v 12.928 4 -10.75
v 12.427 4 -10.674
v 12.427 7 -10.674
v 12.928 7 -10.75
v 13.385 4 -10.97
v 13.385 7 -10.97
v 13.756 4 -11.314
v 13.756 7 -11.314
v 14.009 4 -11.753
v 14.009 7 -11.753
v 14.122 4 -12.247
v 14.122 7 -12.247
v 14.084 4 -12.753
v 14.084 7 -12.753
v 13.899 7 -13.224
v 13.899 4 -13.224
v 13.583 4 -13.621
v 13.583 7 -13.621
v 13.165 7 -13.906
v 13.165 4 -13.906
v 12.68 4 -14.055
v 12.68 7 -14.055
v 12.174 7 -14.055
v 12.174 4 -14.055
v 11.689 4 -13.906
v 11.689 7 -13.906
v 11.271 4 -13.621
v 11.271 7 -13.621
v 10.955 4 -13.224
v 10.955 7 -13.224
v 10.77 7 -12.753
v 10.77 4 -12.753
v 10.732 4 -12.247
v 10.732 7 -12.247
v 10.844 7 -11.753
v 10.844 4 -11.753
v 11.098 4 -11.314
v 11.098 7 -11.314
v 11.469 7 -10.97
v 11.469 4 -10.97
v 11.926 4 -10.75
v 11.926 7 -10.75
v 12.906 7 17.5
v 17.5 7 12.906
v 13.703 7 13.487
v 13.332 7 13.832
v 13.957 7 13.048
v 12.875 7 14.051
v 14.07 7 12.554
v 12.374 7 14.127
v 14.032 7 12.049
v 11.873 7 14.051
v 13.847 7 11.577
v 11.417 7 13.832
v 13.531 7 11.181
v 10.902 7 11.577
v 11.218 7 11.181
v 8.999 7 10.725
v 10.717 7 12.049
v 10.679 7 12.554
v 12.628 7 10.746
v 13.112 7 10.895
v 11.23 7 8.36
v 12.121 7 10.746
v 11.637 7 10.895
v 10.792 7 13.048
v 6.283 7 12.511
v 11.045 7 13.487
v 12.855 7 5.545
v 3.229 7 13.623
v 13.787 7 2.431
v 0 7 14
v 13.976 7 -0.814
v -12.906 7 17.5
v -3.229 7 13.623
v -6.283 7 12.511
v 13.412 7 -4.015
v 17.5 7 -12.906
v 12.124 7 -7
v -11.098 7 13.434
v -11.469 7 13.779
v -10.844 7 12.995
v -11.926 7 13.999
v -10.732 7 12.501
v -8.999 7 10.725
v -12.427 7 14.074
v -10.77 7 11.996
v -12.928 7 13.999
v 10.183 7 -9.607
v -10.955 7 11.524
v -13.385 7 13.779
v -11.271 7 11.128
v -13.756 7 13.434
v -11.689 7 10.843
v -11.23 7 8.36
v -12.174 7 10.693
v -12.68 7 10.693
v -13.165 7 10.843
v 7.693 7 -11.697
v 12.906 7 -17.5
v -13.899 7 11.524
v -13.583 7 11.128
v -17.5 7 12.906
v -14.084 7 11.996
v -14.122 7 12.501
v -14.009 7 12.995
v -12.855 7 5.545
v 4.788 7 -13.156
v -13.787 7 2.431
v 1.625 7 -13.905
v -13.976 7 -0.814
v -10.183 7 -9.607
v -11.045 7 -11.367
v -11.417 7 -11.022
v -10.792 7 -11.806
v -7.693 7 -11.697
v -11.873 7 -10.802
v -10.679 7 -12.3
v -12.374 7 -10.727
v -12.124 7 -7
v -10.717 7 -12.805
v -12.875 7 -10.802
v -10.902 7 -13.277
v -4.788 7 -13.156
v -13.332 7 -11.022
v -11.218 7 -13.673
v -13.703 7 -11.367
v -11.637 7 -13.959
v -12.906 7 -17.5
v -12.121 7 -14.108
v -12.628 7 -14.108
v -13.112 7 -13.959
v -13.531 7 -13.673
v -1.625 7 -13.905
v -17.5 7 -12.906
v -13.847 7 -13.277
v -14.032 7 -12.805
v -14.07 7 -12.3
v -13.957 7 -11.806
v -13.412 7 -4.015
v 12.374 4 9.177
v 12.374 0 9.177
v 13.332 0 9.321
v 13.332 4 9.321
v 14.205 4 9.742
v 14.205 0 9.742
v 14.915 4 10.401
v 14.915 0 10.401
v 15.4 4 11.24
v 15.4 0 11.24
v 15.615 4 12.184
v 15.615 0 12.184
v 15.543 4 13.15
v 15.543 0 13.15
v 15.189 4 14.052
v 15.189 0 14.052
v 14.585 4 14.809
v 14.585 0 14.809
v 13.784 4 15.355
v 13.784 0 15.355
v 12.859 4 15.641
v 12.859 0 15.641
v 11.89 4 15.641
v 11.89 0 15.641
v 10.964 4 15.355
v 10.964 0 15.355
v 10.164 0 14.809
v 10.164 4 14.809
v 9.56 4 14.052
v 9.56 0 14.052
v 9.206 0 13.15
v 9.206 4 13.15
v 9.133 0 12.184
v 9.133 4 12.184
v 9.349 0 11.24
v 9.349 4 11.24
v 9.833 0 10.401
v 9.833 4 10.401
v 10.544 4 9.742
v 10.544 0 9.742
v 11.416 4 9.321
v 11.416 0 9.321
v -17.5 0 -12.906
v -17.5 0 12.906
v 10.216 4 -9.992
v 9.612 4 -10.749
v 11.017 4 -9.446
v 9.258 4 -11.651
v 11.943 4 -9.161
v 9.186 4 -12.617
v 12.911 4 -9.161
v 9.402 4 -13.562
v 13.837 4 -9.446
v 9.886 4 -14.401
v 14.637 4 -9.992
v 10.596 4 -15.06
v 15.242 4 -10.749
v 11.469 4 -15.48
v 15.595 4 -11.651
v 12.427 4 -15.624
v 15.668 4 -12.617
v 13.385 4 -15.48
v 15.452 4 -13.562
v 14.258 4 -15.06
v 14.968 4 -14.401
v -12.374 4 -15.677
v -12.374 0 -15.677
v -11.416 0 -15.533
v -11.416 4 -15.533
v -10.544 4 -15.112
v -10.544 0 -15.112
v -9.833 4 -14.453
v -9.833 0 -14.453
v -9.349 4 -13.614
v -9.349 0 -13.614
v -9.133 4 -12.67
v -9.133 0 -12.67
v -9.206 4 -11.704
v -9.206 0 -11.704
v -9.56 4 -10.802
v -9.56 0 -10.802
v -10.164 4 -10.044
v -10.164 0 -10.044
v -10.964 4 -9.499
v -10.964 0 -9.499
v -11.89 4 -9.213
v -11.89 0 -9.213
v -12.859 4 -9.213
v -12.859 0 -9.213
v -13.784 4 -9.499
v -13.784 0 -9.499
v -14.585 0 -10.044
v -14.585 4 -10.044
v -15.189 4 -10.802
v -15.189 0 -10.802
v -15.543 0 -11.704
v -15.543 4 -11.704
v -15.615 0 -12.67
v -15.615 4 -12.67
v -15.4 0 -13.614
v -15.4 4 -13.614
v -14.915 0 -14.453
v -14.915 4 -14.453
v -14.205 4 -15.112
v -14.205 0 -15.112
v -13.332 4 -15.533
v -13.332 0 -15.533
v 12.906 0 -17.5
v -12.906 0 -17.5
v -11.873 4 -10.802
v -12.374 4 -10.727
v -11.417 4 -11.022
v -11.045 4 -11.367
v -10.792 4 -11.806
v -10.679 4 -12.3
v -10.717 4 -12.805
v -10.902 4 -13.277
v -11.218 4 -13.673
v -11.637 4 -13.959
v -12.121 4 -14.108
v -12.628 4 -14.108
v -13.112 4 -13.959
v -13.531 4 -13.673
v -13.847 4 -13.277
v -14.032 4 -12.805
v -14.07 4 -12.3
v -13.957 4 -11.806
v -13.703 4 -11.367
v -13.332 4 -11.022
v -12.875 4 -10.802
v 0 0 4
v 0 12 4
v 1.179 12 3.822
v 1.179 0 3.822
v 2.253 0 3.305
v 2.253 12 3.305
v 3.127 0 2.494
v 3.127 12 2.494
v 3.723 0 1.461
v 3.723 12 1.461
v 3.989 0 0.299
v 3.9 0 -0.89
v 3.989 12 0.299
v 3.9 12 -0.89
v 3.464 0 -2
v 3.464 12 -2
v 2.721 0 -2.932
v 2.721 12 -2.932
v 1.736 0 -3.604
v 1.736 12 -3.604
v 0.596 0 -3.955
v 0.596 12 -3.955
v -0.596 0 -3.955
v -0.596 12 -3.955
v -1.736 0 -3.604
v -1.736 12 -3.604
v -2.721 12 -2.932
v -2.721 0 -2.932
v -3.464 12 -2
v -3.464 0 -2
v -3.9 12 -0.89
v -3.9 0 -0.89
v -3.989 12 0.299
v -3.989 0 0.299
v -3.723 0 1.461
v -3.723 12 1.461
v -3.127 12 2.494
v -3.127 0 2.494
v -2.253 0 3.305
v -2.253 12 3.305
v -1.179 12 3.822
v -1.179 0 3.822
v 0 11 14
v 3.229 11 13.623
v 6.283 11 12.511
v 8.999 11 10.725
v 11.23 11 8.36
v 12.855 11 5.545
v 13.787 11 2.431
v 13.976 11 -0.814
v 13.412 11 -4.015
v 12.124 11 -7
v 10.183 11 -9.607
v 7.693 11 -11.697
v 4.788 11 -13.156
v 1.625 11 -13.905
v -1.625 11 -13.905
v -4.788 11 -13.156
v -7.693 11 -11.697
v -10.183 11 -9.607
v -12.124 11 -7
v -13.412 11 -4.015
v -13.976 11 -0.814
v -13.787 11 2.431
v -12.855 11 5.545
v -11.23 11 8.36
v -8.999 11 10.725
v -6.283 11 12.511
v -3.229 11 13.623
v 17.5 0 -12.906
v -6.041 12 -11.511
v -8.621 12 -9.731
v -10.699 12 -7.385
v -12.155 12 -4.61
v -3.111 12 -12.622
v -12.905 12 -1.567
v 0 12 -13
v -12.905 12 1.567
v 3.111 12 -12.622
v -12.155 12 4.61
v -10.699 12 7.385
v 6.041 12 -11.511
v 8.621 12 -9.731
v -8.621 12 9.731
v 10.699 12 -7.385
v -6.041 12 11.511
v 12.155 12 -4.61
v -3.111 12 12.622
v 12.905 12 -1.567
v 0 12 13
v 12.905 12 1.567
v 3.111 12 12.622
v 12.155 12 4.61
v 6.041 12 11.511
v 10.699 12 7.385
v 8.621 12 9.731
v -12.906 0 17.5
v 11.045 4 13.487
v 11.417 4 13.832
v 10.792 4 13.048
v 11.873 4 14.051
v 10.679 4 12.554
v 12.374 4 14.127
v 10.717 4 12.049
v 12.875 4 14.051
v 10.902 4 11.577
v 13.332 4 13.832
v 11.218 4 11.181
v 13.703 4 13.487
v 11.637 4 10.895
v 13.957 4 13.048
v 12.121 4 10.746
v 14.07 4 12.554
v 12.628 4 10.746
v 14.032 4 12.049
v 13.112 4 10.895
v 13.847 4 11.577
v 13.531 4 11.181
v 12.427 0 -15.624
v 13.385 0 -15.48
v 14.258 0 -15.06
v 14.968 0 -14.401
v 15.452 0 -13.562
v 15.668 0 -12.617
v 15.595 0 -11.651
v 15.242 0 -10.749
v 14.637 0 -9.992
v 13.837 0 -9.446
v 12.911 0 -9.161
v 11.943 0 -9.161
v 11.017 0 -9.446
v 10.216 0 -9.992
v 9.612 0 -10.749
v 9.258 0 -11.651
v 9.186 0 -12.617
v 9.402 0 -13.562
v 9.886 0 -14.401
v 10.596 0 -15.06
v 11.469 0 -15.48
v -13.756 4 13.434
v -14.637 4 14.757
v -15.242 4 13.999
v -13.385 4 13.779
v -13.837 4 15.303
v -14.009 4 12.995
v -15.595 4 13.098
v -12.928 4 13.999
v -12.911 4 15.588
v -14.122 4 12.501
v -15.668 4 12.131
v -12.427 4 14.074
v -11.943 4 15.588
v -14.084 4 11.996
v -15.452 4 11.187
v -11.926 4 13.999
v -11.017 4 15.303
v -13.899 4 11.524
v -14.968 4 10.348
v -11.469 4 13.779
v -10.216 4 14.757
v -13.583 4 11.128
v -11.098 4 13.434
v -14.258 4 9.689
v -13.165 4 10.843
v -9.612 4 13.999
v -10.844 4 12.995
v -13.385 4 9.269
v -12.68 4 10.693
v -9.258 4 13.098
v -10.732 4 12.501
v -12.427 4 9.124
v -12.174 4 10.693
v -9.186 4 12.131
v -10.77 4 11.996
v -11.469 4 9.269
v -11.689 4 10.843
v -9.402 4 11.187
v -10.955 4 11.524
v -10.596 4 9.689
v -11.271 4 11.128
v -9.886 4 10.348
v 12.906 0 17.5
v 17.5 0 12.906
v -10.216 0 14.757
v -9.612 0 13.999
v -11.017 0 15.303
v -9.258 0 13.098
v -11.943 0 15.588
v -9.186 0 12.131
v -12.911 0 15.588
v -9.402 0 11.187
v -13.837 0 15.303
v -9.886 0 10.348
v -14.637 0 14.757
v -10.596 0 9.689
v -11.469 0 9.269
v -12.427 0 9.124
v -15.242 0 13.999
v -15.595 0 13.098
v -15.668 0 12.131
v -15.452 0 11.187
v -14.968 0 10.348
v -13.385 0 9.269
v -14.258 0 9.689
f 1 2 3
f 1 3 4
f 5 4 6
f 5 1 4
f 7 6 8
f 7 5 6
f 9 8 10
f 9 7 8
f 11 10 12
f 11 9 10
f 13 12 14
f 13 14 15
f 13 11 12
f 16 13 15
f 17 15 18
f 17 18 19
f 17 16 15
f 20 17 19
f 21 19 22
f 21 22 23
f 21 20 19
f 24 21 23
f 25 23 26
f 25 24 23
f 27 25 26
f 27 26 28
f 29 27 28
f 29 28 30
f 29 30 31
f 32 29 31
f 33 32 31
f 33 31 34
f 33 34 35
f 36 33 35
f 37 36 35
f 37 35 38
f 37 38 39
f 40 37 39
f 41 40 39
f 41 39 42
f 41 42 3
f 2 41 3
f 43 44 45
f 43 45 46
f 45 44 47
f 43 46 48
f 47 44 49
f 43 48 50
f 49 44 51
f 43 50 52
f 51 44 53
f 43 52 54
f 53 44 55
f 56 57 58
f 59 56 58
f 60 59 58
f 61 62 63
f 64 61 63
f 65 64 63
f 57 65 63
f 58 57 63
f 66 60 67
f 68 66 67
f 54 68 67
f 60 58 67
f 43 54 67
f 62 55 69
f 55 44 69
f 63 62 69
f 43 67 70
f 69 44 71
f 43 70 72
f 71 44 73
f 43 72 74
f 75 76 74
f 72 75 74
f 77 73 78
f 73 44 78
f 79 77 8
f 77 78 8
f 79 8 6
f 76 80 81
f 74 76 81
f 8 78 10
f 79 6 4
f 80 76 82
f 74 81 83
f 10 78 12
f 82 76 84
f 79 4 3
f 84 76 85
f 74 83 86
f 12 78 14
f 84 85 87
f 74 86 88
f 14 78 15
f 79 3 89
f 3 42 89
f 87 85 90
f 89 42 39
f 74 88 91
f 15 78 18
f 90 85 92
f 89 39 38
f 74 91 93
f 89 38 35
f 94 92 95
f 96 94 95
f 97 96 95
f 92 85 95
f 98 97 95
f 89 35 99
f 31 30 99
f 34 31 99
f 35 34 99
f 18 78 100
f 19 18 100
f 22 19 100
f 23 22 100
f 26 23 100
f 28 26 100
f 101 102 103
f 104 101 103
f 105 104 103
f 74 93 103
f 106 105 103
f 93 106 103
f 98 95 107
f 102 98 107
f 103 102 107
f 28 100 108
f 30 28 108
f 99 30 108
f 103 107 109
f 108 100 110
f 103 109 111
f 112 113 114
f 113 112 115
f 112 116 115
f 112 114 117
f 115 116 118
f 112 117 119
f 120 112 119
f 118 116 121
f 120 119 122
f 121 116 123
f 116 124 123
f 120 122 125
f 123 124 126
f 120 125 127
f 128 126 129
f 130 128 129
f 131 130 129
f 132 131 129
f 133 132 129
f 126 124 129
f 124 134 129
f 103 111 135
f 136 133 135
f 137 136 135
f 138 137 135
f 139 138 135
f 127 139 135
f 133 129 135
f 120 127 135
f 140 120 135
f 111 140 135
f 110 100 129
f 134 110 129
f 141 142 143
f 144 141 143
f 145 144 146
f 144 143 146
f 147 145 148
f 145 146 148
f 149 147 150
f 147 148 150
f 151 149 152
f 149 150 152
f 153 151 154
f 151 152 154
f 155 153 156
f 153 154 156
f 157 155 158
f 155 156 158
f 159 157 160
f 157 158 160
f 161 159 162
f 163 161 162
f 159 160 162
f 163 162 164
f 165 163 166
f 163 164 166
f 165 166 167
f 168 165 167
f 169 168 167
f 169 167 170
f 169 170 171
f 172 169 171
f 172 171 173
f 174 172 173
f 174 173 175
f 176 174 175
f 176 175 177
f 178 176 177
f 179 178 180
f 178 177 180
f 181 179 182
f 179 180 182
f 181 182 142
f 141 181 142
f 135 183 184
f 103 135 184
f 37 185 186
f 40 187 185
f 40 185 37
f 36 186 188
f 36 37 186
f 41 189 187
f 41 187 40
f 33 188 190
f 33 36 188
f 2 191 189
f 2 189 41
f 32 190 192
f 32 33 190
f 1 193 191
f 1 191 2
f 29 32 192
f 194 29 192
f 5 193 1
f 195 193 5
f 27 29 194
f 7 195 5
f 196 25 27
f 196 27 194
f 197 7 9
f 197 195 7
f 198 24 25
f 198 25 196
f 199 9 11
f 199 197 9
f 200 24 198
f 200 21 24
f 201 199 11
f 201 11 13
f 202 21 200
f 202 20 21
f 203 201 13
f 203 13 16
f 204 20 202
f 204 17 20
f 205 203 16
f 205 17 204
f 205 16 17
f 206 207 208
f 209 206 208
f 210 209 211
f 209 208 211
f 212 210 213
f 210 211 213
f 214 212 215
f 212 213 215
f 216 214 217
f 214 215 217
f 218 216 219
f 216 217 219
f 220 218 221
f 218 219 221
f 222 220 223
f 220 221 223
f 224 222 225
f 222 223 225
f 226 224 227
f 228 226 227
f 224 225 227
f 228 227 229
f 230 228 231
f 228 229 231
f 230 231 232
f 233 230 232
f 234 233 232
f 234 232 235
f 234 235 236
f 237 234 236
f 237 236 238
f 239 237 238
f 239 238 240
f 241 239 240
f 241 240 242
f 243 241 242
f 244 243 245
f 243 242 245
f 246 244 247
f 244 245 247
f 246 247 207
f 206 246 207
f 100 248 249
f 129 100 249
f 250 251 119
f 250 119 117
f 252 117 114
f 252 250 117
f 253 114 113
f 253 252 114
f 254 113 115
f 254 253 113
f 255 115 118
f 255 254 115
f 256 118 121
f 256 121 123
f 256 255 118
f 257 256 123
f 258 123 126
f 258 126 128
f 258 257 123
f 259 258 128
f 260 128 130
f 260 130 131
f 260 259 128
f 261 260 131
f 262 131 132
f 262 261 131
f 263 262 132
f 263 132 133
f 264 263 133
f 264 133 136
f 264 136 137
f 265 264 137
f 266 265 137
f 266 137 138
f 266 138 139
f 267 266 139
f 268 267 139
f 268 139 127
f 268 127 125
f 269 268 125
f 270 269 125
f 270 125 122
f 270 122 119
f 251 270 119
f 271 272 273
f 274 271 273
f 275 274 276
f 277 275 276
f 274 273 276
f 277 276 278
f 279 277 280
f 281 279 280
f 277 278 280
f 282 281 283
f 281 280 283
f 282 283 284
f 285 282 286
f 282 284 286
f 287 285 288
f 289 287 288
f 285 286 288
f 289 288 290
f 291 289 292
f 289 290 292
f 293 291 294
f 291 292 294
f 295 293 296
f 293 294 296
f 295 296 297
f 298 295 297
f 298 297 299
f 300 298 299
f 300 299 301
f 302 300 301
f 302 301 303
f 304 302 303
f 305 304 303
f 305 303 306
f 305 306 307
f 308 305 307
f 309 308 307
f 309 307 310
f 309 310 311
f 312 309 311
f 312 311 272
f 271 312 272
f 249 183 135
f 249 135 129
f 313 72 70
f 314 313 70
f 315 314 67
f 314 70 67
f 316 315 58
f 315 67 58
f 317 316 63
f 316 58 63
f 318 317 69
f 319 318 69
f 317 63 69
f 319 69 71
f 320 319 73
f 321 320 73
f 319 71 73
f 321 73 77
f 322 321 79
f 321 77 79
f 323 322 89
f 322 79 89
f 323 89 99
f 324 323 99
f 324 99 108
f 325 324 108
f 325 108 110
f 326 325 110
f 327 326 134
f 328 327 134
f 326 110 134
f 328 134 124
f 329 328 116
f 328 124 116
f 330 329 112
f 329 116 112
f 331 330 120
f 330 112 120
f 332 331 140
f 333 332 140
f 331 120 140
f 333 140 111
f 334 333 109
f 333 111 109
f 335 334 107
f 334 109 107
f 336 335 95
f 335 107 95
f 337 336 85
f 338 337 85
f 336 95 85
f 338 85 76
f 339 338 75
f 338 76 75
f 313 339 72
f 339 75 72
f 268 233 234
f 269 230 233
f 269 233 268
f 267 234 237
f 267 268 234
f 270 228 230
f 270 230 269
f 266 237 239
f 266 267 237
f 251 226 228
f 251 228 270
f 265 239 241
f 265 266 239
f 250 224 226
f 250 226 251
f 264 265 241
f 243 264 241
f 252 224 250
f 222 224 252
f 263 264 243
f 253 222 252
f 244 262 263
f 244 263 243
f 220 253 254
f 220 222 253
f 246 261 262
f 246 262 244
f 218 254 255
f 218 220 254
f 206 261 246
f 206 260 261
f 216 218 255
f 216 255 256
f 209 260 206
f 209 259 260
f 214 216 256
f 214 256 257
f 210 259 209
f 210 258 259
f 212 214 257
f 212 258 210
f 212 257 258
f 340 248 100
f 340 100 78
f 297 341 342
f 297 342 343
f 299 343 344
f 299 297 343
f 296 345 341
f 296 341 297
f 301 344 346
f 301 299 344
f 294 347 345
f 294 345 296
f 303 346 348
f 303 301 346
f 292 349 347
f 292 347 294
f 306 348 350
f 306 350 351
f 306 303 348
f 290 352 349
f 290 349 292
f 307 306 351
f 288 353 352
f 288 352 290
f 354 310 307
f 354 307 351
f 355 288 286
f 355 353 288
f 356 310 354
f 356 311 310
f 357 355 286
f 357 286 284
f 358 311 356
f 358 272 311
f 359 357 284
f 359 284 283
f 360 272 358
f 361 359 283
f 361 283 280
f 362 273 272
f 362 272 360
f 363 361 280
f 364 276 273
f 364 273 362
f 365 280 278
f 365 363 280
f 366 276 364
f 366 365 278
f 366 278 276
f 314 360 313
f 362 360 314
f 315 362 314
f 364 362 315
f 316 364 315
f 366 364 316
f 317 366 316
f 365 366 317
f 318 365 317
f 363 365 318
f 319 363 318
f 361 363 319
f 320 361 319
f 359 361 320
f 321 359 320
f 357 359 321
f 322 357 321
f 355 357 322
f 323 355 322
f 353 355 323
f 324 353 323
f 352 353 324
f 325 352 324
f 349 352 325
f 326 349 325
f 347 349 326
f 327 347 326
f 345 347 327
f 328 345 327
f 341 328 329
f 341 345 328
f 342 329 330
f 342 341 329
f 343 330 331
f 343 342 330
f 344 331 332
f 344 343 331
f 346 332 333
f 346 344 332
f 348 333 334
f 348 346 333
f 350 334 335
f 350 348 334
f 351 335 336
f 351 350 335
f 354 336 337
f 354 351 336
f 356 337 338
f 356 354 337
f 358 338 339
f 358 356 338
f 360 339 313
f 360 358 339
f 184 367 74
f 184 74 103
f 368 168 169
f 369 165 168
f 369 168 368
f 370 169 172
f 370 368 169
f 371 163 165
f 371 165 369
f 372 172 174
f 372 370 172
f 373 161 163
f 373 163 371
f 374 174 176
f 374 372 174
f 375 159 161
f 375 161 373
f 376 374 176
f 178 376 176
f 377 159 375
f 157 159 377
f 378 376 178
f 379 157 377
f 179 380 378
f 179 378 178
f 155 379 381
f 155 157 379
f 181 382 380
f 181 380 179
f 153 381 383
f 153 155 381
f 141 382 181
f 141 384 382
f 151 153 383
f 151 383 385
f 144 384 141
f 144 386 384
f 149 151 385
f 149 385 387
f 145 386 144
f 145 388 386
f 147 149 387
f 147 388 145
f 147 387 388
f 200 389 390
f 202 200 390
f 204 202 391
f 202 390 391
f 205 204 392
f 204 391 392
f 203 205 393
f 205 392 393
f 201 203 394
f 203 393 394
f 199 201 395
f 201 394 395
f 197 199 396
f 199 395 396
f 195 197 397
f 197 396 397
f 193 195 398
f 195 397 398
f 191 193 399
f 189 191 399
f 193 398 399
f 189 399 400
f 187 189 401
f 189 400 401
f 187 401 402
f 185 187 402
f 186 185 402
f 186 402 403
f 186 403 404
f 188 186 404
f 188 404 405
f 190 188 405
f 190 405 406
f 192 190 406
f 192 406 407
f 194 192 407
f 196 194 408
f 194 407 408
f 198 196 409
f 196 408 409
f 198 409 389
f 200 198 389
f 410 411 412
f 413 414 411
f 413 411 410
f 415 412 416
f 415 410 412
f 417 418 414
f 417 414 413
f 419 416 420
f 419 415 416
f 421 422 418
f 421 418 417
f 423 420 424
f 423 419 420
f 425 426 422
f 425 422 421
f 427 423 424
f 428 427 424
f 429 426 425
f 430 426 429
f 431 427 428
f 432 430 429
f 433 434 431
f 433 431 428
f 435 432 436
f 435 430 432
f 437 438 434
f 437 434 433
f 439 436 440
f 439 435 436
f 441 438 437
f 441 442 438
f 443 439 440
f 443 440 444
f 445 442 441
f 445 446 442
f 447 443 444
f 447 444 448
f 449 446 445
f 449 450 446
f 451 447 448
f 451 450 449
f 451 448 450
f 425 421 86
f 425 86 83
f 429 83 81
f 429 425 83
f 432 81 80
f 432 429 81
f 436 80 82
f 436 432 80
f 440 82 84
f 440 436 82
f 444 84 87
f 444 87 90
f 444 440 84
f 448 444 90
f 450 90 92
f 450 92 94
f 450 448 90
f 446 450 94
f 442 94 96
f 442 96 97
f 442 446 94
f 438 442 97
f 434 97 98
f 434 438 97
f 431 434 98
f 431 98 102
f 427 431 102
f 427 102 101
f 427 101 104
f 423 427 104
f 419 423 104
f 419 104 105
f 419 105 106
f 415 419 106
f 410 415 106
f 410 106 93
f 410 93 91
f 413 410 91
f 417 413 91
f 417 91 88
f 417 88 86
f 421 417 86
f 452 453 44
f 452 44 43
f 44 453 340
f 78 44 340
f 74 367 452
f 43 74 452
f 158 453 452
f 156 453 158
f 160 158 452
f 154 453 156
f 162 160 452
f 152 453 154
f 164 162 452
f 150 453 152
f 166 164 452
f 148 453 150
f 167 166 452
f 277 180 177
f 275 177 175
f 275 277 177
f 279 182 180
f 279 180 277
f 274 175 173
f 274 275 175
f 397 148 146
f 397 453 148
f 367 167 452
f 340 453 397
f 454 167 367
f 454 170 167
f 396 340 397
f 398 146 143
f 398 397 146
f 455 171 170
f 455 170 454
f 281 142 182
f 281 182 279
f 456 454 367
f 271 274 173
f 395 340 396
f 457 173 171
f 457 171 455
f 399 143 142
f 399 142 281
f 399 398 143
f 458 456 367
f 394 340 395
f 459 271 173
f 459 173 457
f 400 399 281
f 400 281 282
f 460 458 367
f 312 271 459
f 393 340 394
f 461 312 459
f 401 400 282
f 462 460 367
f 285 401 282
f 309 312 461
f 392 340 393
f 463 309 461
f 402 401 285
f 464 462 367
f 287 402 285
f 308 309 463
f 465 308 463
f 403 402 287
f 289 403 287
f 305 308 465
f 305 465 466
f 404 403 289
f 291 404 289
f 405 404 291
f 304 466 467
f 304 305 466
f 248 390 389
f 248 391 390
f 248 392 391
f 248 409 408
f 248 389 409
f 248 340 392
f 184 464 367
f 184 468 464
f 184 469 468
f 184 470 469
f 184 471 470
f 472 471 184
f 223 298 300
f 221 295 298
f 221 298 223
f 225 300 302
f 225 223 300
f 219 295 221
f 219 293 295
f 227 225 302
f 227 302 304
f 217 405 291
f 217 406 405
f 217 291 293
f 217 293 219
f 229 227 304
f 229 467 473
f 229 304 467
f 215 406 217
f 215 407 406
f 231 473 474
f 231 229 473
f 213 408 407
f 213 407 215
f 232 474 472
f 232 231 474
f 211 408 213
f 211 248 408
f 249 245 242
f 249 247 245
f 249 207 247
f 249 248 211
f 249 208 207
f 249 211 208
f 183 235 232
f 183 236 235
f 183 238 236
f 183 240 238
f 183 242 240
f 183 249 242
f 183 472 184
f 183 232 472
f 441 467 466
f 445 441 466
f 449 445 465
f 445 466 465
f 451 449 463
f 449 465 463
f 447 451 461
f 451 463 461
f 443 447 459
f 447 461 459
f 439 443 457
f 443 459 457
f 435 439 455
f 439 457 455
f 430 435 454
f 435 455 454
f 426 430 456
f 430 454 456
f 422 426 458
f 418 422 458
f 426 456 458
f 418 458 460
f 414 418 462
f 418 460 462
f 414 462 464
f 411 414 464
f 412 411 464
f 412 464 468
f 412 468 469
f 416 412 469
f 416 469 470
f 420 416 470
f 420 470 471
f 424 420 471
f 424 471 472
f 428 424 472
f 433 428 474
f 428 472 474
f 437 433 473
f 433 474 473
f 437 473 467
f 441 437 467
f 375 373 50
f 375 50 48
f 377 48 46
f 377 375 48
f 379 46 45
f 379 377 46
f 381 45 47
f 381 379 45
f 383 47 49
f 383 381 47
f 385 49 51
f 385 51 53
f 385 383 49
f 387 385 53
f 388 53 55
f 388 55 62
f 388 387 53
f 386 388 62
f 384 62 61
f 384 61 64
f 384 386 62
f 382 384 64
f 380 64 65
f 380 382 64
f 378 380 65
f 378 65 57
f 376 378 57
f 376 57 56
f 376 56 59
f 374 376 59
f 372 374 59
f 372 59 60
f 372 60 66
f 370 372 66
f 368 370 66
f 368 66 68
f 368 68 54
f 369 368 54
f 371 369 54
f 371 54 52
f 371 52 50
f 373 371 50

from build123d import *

# Parameters (mm, degrees)
SKETCH_1_R          = 1.7
EXTRUDE_1_DEPTH     = 7
SKETCH_2_R          = 14
EXTRUDE_2_DEPTH     = 5
CUT_EXTRUDE_1_REACH = 29.505
SKETCH_3_R          = 4
SKETCH_4_R          = 3.25
CUT_EXTRUDE_2_DEPTH = 4
CHAMFER_1_SIZE      = 1


with BuildPart() as part:
    # 草图1 → 凸台-拉伸1 (new body)
    with BuildSketch(Plane(origin=(0, 0, 0), x_dir=(1, 0, 0), z_dir=(0, 1, 0))):
        Polygon((0, 17.5), (12.905591591, 17.5), (17.5, 12.905591591), (17.5, 0), (17.5, -12.905591591), (12.905591591, -17.5), (0, -17.5), (-12.905591591, -17.5), (-17.5, -12.905591591), (-17.5, 0), (-17.5, 12.905591591), (-12.905591591, 17.5), align=None)
        with Locations(Location((12.426918465, 12.374368671, 0), (0, 0, 270))):
            Circle(SKETCH_1_R, mode=Mode.SUBTRACT)
        with Locations(Location((12.374368671, -12.426918465, 0), (0, 0, 270))):
            Circle(SKETCH_1_R, mode=Mode.SUBTRACT)
        with Locations(Location((-12.426918465, -12.374368671, 0), (0, 0, 270))):
            Circle(SKETCH_1_R, mode=Mode.SUBTRACT)
        with Locations(Location((-12.374368671, 12.426918465, 0), (0, 0, 270))):
            Circle(SKETCH_1_R, mode=Mode.SUBTRACT)
    extrude(amount=EXTRUDE_1_DEPTH)

    # 草图2 → 凸台-拉伸2 (add)
    with BuildSketch(Plane(origin=(0, 7, 0), x_dir=(1, 0, 0), z_dir=(0, 1, 0))):
        with Locations(Location((0, 0, 0), (0, 0, 270))):
            Circle(SKETCH_2_R)
    extrude(amount=EXTRUDE_2_DEPTH)

    # 草图3 → 切除-拉伸1 (cut, up to next)
    with BuildSketch(Plane(origin=(0, 12, 0), x_dir=(1, 0, 0), z_dir=(0, 1, 0)), mode=Mode.PRIVATE) as cut_extrude_1_sk1:
        with Locations(Location((0, 0, 0), (0, 0, 270))):
            Circle(SKETCH_3_R)
    cut_extrude_1_tool1 = extrude(cut_extrude_1_sk1.sketch, amount=-CUT_EXTRUDE_1_REACH, mode=Mode.PRIVATE) & part.part
    add(cut_extrude_1_tool1.solids().sort_by_distance((0, 12, 0))[0], mode=Mode.SUBTRACT)

    # 草图4 → 切除-拉伸2 (cut)
    with BuildSketch(Plane.XZ):
        with Locations(Location((-12.426918465, 12.374368671, 0), (0, 0, 270))):
            Circle(SKETCH_4_R)
        with Locations(Location((12.374368671, 12.426918465, 0), (0, 0, 270))):
            Circle(SKETCH_4_R)
        with Locations(Location((12.426918465, -12.374368671, 0), (0, 0, 270))):
            Circle(SKETCH_4_R)
        with Locations(Location((-12.374368671, -12.426918465, 0), (0, 0, 270))):
            Circle(SKETCH_4_R)
    extrude(amount=-CUT_EXTRUDE_2_DEPTH, mode=Mode.SUBTRACT)

    # 倒角1
    chamfer_1_edges = [part.edges().sort_by_distance(p)[0] for p in [
        (0, 12, -14),
    ]]
    chamfer(chamfer_1_edges, length=CHAMFER_1_SIZE)


solid = part.part
